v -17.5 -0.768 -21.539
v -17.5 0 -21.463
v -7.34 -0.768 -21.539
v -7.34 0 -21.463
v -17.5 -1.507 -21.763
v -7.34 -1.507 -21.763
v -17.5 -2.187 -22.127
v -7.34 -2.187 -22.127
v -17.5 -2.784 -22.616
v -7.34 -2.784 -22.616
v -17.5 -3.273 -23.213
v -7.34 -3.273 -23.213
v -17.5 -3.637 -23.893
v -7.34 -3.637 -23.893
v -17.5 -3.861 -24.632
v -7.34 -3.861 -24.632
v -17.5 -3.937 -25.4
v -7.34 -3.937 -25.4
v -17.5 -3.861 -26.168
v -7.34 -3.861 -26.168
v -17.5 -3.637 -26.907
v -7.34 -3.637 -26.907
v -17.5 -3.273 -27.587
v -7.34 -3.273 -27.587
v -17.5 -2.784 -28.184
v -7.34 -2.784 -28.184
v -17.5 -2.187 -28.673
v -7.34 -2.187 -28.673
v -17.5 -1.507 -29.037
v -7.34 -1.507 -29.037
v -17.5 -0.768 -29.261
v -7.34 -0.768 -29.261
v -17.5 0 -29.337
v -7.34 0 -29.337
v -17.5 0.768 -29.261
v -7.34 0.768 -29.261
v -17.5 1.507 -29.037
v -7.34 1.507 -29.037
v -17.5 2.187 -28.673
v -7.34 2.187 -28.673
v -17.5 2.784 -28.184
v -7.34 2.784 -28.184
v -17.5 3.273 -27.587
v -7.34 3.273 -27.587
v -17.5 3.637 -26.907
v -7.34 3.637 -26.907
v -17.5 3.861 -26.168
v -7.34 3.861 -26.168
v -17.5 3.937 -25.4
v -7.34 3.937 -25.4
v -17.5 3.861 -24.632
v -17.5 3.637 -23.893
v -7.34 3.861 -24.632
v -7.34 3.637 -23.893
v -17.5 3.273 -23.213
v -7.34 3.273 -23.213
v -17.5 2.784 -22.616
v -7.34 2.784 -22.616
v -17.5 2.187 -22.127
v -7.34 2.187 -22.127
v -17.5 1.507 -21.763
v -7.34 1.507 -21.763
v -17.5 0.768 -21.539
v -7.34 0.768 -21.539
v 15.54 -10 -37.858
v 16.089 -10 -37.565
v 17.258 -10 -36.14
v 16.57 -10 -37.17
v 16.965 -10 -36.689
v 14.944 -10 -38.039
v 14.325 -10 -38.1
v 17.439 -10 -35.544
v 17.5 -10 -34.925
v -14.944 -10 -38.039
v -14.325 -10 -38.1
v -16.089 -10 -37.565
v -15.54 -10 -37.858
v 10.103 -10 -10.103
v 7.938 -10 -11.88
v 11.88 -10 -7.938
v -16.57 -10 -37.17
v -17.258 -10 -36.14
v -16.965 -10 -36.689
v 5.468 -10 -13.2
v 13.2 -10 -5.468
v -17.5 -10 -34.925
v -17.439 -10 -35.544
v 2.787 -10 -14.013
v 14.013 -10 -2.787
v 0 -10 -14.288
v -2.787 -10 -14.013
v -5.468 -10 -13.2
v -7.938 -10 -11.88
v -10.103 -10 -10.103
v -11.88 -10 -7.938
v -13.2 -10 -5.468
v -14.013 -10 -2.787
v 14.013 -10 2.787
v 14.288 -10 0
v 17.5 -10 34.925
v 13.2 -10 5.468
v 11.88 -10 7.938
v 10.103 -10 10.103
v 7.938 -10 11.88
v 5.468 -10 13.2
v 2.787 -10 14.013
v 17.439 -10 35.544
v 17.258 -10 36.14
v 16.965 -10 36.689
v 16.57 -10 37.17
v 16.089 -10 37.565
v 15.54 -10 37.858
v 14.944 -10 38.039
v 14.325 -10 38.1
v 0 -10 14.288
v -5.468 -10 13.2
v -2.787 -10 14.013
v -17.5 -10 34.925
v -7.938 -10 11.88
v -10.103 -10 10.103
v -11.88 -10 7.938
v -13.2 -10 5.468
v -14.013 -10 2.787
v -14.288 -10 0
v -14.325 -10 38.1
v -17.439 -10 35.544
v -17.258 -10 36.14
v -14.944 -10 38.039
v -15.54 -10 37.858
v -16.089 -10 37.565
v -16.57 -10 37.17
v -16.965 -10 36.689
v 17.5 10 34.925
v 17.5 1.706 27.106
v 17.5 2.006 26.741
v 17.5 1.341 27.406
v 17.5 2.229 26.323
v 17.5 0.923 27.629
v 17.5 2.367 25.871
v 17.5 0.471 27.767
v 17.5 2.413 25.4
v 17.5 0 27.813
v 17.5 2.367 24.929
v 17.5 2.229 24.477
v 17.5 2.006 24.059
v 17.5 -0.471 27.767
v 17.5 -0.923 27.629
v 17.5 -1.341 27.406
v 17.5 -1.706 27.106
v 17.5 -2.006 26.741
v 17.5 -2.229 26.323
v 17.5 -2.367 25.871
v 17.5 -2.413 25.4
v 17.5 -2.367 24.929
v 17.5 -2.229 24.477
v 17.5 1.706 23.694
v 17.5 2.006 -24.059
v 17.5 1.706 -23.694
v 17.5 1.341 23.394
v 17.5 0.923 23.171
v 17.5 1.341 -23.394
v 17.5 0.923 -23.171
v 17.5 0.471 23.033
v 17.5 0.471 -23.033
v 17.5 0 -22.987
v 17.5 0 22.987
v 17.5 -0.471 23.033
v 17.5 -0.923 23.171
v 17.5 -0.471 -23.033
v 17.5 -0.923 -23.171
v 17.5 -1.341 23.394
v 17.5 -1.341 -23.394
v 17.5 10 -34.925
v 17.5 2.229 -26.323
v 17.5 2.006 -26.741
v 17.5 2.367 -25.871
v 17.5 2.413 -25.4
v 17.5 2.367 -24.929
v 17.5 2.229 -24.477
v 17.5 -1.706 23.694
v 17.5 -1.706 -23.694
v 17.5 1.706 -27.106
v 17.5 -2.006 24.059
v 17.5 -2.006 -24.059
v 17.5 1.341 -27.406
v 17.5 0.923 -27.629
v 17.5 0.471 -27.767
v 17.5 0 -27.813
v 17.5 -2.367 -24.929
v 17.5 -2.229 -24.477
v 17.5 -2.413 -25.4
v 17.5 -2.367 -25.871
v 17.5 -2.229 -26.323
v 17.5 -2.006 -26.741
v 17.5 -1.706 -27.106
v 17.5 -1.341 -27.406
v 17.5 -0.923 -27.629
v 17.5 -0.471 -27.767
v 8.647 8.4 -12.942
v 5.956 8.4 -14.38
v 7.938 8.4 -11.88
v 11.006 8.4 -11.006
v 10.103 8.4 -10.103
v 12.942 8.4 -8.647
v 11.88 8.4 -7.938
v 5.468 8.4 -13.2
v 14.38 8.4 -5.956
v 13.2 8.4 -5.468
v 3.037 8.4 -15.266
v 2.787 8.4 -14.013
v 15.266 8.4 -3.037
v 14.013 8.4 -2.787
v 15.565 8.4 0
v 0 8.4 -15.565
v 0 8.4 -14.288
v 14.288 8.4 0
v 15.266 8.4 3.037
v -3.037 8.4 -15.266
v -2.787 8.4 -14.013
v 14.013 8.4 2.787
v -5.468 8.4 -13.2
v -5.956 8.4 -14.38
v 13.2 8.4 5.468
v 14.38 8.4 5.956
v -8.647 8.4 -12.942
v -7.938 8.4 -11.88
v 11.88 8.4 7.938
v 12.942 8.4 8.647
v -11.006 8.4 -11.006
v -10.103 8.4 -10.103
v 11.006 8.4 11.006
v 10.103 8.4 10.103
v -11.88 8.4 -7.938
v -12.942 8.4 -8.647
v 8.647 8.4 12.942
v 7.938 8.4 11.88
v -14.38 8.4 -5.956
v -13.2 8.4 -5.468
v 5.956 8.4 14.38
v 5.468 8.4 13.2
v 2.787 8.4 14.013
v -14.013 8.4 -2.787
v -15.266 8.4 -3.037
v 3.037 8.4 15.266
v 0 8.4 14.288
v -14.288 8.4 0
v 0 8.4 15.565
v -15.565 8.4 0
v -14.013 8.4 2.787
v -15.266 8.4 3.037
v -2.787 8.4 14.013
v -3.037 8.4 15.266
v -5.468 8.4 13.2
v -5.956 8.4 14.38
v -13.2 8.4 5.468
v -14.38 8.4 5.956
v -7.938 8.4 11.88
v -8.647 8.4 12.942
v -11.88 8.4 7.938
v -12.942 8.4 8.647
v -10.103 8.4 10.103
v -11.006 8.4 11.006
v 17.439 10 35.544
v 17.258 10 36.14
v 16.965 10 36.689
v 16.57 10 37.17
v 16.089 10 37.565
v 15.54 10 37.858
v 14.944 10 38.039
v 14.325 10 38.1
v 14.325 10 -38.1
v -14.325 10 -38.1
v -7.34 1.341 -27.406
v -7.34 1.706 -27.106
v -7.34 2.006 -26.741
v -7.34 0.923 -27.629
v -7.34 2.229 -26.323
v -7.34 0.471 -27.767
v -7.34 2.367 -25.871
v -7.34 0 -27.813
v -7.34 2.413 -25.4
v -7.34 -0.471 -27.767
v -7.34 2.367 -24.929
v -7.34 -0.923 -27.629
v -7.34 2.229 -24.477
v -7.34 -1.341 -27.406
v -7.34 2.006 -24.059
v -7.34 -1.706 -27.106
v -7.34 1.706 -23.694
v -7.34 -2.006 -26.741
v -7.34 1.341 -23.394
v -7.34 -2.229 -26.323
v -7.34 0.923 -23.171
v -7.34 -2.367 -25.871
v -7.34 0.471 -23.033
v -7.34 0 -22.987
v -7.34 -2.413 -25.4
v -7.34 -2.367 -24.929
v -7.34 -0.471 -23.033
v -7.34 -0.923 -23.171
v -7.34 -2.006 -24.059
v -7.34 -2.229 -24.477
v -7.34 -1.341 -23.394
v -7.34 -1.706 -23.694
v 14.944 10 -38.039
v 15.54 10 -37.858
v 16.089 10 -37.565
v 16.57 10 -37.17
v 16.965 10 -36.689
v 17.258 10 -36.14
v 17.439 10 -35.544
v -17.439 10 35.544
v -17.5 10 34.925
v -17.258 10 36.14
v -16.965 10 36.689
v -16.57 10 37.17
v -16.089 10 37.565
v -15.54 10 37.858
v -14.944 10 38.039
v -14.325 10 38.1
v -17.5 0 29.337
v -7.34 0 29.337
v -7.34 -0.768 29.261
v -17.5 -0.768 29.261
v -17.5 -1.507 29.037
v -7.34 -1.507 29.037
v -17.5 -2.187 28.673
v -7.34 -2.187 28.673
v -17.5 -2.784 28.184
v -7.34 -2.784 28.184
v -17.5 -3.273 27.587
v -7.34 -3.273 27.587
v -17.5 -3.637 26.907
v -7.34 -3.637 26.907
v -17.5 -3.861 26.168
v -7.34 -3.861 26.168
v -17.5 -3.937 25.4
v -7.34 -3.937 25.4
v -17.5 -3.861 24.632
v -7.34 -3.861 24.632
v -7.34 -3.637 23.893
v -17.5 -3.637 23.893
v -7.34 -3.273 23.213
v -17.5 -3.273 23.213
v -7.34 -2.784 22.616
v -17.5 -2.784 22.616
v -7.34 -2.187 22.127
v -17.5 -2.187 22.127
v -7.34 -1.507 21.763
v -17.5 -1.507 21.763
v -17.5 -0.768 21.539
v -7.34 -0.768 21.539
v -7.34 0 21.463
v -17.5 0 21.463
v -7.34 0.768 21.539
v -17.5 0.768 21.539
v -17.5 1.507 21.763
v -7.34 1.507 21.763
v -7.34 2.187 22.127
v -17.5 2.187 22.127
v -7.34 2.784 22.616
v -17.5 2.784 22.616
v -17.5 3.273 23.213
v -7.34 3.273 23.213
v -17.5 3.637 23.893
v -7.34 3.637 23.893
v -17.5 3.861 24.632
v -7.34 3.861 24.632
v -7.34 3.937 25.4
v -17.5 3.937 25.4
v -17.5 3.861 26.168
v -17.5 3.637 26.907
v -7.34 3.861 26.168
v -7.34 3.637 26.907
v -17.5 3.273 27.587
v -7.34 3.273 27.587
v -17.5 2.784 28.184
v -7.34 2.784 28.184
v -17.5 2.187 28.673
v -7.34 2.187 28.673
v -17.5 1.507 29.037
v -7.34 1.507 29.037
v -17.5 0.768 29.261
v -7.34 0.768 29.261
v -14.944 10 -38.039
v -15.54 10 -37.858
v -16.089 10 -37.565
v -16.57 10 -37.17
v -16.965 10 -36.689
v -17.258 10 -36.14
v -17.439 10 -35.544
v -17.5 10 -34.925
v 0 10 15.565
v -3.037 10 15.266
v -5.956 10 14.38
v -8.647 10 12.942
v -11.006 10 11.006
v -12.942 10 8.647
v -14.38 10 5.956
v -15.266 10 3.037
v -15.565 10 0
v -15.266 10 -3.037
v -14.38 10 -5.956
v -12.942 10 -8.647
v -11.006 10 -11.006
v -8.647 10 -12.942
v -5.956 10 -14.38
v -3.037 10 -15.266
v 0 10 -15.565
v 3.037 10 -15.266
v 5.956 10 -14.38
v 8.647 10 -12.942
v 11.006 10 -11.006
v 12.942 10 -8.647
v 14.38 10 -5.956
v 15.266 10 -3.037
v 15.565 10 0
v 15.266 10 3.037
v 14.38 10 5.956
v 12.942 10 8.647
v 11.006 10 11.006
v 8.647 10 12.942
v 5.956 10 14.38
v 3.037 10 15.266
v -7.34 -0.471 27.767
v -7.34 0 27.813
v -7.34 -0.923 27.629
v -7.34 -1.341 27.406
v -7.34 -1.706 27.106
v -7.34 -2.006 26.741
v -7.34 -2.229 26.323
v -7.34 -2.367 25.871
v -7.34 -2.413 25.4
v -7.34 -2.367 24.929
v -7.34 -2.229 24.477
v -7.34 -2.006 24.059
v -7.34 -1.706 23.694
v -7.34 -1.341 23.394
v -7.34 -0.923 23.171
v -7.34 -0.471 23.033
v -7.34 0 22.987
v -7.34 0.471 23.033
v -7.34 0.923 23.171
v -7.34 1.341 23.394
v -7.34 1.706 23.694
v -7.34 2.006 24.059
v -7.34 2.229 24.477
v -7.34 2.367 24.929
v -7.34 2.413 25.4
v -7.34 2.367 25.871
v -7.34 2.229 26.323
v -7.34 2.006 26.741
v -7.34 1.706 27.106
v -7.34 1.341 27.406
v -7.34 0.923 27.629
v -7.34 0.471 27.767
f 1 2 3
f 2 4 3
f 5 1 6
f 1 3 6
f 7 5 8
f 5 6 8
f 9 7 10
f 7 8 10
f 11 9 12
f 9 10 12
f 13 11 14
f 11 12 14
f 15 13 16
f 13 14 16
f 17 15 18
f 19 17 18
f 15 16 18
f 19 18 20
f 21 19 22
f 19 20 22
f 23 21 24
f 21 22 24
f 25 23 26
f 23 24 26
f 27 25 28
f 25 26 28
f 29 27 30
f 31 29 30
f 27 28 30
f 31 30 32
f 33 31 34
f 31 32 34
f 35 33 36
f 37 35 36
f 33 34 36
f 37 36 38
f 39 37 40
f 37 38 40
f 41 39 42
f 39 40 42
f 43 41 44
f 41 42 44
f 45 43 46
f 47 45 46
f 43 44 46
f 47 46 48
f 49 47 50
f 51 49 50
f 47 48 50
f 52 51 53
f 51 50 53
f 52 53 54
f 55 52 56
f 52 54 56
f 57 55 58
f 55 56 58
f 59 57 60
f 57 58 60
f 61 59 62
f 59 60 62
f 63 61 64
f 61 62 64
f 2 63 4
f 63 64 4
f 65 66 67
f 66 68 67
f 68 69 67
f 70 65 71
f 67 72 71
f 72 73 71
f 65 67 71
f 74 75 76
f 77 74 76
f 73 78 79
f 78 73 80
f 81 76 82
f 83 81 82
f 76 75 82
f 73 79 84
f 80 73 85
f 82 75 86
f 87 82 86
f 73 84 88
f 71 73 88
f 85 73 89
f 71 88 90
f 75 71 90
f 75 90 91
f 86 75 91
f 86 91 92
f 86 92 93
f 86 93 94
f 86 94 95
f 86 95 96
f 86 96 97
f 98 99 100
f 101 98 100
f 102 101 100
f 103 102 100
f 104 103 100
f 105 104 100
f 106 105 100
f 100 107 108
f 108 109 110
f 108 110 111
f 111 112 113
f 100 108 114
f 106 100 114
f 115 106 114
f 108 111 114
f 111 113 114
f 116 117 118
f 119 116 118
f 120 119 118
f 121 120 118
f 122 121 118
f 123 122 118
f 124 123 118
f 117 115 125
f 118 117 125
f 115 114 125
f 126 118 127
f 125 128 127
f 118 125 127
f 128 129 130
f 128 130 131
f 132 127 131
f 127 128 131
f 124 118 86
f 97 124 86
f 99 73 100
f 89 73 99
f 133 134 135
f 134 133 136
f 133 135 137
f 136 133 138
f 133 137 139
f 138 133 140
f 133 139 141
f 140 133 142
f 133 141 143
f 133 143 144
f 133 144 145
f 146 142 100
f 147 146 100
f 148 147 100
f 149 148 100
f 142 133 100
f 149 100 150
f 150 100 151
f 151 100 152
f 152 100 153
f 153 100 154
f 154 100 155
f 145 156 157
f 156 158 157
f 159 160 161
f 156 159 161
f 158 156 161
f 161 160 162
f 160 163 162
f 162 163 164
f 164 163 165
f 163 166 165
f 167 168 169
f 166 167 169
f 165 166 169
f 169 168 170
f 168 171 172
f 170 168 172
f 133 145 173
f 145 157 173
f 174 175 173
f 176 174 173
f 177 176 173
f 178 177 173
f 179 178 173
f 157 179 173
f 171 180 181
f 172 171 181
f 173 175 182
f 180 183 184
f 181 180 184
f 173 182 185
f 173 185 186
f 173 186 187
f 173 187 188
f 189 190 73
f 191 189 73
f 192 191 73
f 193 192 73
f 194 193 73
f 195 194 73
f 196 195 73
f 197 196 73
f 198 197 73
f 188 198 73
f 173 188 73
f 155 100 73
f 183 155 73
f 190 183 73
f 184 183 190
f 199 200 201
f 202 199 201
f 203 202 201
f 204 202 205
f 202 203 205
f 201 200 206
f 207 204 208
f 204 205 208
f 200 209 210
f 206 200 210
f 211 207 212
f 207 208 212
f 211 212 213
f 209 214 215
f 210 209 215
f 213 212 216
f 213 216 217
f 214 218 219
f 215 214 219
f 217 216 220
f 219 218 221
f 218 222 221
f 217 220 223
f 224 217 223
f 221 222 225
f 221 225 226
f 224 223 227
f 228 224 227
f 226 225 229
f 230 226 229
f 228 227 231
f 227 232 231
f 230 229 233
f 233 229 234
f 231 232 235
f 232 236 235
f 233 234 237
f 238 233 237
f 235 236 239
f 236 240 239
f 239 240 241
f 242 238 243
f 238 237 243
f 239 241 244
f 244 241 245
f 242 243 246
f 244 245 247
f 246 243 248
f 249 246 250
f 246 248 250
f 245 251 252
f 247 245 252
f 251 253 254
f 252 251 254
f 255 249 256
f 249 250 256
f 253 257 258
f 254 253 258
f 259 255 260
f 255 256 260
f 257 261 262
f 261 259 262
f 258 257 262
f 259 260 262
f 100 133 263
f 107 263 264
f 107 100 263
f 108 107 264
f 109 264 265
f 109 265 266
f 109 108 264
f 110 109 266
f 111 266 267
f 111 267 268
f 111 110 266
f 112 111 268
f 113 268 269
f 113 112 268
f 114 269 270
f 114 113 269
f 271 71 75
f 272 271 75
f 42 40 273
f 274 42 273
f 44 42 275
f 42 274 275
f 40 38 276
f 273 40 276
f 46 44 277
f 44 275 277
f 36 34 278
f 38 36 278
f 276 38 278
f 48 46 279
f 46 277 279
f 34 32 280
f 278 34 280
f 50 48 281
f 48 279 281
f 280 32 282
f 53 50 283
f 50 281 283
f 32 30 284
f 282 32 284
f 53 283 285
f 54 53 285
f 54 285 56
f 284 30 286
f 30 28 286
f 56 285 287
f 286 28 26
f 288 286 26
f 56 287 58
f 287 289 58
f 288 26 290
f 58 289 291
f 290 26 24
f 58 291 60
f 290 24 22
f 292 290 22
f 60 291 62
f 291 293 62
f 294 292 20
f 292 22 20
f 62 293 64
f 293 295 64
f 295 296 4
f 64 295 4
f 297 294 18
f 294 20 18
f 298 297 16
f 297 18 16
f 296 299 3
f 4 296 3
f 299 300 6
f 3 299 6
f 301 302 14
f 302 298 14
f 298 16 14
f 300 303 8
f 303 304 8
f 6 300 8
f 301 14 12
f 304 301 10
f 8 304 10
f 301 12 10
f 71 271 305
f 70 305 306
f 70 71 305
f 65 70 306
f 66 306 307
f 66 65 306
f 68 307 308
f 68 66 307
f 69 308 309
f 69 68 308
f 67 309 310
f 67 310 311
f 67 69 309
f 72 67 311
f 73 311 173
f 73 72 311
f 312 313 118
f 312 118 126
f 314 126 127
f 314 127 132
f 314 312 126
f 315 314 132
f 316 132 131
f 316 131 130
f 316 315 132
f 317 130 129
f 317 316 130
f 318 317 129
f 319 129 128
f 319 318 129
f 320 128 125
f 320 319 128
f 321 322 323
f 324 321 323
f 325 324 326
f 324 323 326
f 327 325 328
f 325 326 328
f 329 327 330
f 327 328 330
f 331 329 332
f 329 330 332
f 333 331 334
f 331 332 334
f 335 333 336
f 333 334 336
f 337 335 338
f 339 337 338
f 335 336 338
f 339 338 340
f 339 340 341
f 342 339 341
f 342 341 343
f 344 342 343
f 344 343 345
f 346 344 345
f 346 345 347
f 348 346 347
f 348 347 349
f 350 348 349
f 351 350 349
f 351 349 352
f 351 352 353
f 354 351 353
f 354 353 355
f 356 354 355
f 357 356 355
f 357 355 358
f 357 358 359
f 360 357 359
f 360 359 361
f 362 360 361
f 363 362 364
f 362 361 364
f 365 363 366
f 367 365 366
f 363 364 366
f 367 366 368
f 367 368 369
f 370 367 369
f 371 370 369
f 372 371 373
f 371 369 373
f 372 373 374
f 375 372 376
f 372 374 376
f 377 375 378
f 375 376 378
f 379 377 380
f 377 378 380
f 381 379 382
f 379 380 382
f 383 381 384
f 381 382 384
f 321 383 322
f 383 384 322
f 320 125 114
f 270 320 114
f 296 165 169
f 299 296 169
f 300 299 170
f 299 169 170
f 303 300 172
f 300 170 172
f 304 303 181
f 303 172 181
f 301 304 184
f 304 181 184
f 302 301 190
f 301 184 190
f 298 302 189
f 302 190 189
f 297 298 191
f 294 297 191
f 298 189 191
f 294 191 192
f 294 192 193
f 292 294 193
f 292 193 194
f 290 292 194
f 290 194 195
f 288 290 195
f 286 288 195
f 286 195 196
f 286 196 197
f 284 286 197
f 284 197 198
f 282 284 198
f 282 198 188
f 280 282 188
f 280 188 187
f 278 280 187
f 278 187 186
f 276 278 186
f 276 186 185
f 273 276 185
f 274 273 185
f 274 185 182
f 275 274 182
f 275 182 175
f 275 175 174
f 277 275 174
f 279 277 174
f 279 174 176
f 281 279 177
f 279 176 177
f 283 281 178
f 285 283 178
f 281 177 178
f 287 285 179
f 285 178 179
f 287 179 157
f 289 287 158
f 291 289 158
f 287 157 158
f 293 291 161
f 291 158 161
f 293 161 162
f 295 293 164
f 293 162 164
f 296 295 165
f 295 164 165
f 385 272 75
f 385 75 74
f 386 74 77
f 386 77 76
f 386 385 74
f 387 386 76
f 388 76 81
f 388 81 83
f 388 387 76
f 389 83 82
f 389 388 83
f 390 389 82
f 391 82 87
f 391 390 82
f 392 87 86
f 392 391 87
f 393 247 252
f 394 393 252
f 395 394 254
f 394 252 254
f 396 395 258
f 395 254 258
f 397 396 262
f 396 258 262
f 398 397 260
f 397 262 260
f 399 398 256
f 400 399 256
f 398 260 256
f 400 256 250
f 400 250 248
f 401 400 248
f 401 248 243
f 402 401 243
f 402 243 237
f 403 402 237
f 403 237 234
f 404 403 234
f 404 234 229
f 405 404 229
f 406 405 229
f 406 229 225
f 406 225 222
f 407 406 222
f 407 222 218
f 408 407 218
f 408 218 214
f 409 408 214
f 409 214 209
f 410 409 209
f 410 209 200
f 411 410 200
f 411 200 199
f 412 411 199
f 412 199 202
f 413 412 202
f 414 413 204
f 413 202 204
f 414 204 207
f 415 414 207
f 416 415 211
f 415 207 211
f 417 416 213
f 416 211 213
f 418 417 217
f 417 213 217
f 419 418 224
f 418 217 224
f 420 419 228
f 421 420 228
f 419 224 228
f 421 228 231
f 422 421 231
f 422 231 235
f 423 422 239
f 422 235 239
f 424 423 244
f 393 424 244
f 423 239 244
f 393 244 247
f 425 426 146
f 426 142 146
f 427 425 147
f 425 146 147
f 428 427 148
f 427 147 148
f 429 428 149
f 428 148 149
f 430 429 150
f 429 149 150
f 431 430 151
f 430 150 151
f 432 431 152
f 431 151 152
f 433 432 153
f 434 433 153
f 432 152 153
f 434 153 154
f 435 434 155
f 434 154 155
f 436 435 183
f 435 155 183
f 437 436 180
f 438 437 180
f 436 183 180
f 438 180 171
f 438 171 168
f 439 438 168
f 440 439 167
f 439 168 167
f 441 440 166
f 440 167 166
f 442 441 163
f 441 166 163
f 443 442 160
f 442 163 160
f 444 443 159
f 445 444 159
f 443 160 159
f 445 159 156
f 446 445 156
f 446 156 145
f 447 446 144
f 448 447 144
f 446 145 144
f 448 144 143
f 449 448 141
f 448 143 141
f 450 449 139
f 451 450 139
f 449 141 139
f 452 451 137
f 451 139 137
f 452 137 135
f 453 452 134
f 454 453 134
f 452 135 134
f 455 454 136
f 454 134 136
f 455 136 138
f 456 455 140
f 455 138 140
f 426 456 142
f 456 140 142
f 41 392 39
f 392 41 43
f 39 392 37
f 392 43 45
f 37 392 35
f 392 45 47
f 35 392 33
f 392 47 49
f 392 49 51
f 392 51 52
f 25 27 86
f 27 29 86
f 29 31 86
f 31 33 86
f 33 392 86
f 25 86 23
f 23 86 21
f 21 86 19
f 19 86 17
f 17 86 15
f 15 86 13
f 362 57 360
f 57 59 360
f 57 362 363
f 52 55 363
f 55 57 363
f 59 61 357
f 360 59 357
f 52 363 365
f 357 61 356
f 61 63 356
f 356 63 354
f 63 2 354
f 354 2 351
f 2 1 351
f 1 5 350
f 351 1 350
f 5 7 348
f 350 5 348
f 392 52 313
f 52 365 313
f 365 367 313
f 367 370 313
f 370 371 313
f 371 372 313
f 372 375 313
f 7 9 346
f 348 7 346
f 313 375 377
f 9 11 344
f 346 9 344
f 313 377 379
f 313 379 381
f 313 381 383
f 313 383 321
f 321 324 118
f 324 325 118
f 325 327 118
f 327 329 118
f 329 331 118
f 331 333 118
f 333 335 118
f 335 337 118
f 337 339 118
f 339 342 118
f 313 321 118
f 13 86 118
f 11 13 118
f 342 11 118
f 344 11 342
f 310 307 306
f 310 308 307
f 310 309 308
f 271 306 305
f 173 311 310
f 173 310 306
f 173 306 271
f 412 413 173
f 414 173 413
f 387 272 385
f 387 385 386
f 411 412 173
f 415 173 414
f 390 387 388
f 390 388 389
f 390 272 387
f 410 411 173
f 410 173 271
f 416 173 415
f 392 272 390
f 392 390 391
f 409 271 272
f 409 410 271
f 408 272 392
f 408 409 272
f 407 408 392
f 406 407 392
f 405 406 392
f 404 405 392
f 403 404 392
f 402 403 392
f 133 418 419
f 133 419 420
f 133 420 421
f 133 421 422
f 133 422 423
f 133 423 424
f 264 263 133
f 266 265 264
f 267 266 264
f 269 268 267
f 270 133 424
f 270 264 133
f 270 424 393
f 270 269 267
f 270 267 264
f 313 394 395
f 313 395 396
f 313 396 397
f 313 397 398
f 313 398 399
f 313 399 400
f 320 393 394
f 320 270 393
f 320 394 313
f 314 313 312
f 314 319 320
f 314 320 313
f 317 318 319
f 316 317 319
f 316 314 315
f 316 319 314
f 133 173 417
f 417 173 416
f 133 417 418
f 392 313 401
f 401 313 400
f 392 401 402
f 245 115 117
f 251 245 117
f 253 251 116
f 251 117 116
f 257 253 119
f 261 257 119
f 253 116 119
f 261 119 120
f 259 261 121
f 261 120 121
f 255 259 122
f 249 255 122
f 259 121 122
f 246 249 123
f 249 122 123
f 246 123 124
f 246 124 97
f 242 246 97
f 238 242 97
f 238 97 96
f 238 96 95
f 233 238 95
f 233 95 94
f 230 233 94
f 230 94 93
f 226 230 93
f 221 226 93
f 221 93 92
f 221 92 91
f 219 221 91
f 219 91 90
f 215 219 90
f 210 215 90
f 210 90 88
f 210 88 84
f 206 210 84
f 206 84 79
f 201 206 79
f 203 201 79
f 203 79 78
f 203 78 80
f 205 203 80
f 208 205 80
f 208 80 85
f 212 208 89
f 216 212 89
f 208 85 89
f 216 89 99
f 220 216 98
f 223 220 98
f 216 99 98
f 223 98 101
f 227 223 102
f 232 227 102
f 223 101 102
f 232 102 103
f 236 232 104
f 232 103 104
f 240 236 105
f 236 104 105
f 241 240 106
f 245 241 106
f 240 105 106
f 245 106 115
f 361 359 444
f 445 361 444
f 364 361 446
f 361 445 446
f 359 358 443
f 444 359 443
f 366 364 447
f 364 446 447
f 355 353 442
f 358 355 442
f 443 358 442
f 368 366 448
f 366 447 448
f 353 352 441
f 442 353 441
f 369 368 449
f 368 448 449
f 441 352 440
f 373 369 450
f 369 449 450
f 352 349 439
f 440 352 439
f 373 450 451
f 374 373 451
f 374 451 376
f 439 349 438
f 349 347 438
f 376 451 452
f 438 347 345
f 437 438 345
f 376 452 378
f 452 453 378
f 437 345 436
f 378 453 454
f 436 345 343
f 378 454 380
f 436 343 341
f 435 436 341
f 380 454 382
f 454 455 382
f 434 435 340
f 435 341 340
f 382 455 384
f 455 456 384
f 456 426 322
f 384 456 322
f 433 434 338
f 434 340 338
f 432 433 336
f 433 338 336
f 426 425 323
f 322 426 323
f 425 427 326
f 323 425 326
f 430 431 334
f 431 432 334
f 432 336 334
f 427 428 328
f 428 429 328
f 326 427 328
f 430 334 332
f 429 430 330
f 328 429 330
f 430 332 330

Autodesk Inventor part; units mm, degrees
ref_plane "YZ Plane" through (0, 0, 0) normal (1, 0, 0) x (0, 1, 0)
ref_plane "XZ Plane" through (0, 0, 0) normal (0, 1, 0) x (-1, 0, 0)
ref_plane "XY Plane" through (0, 0, 0) normal (0, 0, 1) x (1, 0, 0)
sketch "Sketch1" plane through (0, 0, 0) normal (0, 1, 0) x (-1, 0, 0)
  line L0 (0, -53.34) -> (0, 53.34) projected
  line L1 (-24.5, 0) -> (24.5, 0) projected
  line L2 (24.5, 0) -> (-24.5, 0) projected
  line L3 (0, -53.34) -> (0, 53.34) projected
  line L4 (-17.5, 38.1) -> (-17.5, -38.1)
  line L5 (-17.5, -38.1) -> (17.5, -38.1)
  line L6 (17.5, -38.1) -> (17.5, 38.1)
  line L7 (17.5, 38.1) -> (-17.5, 38.1)
  line L8 (-17.5, -38.1) -> (17.5, 38.1) construction
  point P0 (0, 0)
  dimension "d1" = 76.2
  dimension "d2" = 35
extrude "Extrusion1" add sketch "Sketch1" along normal mid plane 20
sketch "Sketch2" plane through (0, 10, 0) normal (0, 1, 0) x (1, 0, 0)
  point P0 (0, 0)
  point P1 (0, 0)
hole "Hole1" at (0, 10, 0) direction (0, -1, 0) diameter 28.575 end through all counterbore diameter 31.13 counterbore depth 1.6
fillet "Fillet1" radius 3.175 4 edges at (17.5, 0, 38.1) (17.5, 0, -38.1) (-17.5, 0, 38.1) (-17.5, 0, -38.1)
sketch "Sketch3" plane through (-17.5, -10, -34.925) normal (-1, 0, 0) x (0, 0, 1)
  line L0 (0, 0) -> (0, 20) projected
  line L1 (69.85, 0) -> (0, 0) projected
  line L2 (69.85, 20) -> (69.85, 0) projected
  line L3 (0, 20) -> (69.85, 20) projected
  line L4 (0, 20) -> (0, 0) projected
  line L5 (0, 0) -> (69.85, 0)
  line L6 (69.85, 0) -> (69.85, 20)
  line L7 (69.85, 20) -> (0, 20)
  line L8 (0, 20) -> (0, 0)
  line L9 (19.36, 20) -> (50.49, 20) projected
  line L10 (34.925, 20) -> (34.925, 0)
  line L11 (0, 10) -> (69.85, 10)
  line L12 (69.85, 0) -> (69.85, 20) projected
  point P0 (34.925, 10)
  point P1 (9.525, 10)
  point P2 (60.325, 10)
  dimension "d19" = 25.4
  dimension "d20" = 25.4
hole "Hole2" at (-17.5, 0, -25.4) at (-17.5, 0, 25.4) direction (1, 0, 0) diameter 4.826 end through all counterbore diameter 7.874 counterbore depth 10.16
properties part number "BearingBlock30mmRight"
